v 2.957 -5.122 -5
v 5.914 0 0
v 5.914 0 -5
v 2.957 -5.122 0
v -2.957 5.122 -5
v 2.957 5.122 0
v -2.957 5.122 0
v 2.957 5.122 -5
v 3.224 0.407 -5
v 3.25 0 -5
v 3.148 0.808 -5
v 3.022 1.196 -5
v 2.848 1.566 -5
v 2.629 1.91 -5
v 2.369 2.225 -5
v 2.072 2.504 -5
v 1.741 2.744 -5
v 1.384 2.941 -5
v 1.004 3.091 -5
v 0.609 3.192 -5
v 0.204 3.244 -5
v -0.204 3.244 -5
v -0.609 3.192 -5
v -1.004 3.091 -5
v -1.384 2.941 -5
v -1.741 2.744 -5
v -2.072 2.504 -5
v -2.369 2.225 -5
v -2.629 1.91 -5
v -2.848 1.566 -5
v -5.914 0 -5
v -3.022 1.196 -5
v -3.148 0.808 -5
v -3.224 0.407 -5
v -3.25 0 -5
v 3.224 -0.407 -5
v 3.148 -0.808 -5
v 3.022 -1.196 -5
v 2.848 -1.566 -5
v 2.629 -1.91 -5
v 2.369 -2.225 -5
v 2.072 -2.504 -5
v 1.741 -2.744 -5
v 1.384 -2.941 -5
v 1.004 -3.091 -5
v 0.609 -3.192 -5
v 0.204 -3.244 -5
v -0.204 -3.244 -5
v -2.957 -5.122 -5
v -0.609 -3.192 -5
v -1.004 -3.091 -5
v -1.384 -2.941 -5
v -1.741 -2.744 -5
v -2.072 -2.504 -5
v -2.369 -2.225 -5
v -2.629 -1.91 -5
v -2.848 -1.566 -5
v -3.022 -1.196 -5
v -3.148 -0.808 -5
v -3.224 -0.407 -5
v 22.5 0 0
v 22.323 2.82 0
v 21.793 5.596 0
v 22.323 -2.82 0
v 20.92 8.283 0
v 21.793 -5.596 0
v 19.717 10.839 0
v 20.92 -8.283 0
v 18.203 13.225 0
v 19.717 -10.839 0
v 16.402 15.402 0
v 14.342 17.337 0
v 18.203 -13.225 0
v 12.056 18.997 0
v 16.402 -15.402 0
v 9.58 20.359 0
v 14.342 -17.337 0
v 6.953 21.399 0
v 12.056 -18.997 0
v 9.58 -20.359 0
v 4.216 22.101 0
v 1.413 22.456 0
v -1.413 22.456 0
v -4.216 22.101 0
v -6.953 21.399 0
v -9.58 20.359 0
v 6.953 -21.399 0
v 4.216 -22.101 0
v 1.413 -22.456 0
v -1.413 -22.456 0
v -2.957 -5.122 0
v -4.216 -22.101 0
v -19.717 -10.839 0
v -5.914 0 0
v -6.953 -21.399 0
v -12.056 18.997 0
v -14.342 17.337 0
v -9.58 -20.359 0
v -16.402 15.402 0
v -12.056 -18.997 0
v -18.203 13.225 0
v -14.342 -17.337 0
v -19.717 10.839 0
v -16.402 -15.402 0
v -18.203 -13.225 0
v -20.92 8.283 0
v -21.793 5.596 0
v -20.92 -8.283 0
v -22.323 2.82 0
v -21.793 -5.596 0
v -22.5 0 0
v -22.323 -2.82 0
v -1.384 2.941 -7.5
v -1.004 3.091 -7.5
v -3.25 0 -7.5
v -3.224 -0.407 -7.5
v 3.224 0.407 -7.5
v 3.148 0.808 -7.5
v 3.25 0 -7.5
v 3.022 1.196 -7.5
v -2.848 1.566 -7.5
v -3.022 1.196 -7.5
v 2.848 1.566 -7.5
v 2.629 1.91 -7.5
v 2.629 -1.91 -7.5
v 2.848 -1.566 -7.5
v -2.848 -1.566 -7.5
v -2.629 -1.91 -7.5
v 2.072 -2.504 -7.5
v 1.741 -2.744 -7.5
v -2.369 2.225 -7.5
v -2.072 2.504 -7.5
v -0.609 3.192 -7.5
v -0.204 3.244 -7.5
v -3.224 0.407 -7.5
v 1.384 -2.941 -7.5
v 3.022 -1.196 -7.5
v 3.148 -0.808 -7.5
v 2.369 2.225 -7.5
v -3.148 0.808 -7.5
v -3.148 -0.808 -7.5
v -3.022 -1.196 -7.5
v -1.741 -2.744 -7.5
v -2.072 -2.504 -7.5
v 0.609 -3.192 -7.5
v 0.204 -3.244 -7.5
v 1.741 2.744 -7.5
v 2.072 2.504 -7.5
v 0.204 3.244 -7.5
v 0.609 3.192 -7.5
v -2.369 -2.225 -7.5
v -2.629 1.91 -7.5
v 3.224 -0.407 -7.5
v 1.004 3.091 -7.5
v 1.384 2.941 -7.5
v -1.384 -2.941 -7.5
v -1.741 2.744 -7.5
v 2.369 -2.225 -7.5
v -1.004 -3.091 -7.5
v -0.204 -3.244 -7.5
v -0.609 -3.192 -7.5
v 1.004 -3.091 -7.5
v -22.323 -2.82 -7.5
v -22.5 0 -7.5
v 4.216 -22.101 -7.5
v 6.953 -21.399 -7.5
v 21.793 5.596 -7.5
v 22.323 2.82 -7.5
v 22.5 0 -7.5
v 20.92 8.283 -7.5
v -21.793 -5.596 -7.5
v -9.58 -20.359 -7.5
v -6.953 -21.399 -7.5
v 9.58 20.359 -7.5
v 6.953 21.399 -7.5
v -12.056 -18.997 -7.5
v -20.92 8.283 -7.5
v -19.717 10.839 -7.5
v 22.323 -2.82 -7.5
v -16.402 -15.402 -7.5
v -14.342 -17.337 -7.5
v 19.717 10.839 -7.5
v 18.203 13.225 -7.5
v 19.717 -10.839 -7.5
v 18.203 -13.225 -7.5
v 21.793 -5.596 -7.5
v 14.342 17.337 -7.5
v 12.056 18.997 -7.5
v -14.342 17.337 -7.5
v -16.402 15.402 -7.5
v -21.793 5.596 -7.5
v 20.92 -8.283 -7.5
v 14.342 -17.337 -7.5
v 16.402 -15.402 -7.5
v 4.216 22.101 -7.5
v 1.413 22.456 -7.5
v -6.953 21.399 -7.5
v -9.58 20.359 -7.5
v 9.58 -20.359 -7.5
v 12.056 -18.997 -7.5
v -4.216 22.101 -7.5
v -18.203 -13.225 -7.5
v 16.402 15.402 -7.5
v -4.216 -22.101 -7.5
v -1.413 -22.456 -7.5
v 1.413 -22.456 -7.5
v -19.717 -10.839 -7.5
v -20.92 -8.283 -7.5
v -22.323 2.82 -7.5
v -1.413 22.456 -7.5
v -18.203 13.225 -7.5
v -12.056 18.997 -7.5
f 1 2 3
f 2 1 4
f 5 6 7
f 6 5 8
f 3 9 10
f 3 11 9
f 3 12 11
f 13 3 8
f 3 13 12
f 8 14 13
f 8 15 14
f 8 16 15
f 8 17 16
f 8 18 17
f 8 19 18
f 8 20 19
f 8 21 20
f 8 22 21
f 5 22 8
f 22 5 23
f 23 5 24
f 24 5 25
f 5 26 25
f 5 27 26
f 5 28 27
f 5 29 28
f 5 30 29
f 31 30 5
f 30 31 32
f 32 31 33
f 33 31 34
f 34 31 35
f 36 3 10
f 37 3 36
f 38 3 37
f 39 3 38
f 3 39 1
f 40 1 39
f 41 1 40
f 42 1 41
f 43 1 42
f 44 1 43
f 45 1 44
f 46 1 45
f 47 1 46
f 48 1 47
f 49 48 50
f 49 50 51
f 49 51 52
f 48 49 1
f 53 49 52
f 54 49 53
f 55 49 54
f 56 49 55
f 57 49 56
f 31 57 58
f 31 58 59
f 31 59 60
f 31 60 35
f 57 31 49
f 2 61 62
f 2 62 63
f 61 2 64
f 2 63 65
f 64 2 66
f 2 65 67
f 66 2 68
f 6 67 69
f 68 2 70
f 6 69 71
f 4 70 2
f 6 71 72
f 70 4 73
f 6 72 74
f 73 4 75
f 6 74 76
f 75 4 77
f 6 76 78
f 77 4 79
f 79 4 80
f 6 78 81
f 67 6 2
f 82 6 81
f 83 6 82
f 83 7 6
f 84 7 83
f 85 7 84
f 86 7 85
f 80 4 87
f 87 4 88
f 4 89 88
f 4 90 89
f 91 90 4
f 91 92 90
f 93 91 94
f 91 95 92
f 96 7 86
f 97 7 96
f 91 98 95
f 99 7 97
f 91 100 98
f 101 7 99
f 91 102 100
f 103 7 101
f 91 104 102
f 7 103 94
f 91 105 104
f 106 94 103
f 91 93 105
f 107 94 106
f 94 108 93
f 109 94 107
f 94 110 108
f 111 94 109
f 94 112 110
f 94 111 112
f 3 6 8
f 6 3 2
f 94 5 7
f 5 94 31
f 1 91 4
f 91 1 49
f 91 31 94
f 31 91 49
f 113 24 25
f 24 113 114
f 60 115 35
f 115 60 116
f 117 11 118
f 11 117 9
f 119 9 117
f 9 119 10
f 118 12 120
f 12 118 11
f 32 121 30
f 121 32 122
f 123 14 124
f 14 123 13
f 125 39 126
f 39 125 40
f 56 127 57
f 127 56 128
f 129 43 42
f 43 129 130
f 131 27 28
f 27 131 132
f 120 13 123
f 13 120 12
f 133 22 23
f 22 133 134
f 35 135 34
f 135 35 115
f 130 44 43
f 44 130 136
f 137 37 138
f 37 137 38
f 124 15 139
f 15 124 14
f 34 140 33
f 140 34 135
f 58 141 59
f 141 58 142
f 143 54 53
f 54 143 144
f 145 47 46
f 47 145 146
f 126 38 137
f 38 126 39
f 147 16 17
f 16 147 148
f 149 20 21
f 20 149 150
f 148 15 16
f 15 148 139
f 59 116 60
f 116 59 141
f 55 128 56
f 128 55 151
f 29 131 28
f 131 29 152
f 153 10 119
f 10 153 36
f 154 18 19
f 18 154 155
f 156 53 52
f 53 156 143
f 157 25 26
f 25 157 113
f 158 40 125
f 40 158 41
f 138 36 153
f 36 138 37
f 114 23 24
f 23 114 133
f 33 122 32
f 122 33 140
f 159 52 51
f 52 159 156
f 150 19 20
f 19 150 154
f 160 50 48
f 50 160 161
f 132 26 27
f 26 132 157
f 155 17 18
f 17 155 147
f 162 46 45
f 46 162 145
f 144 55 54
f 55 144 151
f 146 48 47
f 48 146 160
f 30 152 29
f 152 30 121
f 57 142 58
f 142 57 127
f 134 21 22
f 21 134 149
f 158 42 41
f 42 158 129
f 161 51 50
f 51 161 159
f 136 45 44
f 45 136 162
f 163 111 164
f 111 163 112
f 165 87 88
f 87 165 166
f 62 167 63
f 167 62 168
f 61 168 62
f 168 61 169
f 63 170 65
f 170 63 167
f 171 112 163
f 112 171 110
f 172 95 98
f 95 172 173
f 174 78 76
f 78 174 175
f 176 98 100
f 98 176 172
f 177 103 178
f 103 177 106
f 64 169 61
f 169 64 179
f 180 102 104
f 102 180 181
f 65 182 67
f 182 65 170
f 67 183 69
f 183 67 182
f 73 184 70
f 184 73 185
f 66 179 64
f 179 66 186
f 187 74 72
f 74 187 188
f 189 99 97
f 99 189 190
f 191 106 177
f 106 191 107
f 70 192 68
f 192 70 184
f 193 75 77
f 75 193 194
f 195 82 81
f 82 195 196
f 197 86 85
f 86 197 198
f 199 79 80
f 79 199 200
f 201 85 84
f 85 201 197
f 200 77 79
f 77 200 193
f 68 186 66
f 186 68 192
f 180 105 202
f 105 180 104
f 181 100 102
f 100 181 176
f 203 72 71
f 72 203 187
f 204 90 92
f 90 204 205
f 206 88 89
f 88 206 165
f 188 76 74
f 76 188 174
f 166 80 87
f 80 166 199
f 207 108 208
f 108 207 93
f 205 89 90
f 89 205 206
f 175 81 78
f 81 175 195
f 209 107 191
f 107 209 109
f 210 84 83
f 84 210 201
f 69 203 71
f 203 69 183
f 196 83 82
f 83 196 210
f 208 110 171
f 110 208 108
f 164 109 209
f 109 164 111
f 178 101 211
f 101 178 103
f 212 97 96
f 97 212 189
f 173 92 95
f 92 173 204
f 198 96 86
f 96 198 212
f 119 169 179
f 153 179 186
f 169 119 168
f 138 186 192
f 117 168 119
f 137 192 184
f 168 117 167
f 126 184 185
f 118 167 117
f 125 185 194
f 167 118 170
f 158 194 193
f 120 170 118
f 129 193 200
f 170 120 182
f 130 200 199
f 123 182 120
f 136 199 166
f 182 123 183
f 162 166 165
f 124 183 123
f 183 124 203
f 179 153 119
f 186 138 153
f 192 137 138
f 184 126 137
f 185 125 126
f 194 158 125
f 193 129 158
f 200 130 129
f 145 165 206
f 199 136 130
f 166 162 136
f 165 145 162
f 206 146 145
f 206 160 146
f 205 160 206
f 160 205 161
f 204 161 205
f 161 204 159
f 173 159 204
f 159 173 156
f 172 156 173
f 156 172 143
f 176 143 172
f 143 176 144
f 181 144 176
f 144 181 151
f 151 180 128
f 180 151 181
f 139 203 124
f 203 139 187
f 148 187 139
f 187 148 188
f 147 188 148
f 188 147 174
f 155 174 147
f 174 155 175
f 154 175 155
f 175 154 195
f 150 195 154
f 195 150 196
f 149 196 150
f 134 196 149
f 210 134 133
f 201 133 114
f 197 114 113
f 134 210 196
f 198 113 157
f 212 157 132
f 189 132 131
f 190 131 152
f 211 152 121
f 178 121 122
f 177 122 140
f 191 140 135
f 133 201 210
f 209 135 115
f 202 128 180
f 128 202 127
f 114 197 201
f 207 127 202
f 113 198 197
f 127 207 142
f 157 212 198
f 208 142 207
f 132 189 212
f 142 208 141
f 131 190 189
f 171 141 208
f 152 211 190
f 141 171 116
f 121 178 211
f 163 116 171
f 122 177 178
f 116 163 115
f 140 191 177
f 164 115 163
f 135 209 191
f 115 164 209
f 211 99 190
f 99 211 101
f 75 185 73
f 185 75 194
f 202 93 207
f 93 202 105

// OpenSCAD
$fn = 50;

difference() {
	union() {
		translate(v = [0, 0, -7.5]) {
			cylinder(h = 7.5, r = 22.5);
		}
	}
	union() {
		translate(v = [0, 0, 0]) {
			rotate(a = [0, 0, 0]) {
				difference() {
					union() {
						translate(v = [0, 0, -5]) {
							linear_extrude(height = 5) {
								polygon(points = [[5.914249999999999, 0.0], [2.957125, 5.1218907443321156], [-2.9571249999999982, 5.1218907443321156], [-5.914249999999999, 7.242867331857232e-16], [-2.9571250000000022, -5.121890744332115], [2.9571249999999956, -5.121890744332118]]);
							}
						}
					}
					union();
				}
			}
		}
		#translate(v = [0, 0, -100.0]) {
			cylinder(h = 200, r = 3.25);
		}
	}
}
